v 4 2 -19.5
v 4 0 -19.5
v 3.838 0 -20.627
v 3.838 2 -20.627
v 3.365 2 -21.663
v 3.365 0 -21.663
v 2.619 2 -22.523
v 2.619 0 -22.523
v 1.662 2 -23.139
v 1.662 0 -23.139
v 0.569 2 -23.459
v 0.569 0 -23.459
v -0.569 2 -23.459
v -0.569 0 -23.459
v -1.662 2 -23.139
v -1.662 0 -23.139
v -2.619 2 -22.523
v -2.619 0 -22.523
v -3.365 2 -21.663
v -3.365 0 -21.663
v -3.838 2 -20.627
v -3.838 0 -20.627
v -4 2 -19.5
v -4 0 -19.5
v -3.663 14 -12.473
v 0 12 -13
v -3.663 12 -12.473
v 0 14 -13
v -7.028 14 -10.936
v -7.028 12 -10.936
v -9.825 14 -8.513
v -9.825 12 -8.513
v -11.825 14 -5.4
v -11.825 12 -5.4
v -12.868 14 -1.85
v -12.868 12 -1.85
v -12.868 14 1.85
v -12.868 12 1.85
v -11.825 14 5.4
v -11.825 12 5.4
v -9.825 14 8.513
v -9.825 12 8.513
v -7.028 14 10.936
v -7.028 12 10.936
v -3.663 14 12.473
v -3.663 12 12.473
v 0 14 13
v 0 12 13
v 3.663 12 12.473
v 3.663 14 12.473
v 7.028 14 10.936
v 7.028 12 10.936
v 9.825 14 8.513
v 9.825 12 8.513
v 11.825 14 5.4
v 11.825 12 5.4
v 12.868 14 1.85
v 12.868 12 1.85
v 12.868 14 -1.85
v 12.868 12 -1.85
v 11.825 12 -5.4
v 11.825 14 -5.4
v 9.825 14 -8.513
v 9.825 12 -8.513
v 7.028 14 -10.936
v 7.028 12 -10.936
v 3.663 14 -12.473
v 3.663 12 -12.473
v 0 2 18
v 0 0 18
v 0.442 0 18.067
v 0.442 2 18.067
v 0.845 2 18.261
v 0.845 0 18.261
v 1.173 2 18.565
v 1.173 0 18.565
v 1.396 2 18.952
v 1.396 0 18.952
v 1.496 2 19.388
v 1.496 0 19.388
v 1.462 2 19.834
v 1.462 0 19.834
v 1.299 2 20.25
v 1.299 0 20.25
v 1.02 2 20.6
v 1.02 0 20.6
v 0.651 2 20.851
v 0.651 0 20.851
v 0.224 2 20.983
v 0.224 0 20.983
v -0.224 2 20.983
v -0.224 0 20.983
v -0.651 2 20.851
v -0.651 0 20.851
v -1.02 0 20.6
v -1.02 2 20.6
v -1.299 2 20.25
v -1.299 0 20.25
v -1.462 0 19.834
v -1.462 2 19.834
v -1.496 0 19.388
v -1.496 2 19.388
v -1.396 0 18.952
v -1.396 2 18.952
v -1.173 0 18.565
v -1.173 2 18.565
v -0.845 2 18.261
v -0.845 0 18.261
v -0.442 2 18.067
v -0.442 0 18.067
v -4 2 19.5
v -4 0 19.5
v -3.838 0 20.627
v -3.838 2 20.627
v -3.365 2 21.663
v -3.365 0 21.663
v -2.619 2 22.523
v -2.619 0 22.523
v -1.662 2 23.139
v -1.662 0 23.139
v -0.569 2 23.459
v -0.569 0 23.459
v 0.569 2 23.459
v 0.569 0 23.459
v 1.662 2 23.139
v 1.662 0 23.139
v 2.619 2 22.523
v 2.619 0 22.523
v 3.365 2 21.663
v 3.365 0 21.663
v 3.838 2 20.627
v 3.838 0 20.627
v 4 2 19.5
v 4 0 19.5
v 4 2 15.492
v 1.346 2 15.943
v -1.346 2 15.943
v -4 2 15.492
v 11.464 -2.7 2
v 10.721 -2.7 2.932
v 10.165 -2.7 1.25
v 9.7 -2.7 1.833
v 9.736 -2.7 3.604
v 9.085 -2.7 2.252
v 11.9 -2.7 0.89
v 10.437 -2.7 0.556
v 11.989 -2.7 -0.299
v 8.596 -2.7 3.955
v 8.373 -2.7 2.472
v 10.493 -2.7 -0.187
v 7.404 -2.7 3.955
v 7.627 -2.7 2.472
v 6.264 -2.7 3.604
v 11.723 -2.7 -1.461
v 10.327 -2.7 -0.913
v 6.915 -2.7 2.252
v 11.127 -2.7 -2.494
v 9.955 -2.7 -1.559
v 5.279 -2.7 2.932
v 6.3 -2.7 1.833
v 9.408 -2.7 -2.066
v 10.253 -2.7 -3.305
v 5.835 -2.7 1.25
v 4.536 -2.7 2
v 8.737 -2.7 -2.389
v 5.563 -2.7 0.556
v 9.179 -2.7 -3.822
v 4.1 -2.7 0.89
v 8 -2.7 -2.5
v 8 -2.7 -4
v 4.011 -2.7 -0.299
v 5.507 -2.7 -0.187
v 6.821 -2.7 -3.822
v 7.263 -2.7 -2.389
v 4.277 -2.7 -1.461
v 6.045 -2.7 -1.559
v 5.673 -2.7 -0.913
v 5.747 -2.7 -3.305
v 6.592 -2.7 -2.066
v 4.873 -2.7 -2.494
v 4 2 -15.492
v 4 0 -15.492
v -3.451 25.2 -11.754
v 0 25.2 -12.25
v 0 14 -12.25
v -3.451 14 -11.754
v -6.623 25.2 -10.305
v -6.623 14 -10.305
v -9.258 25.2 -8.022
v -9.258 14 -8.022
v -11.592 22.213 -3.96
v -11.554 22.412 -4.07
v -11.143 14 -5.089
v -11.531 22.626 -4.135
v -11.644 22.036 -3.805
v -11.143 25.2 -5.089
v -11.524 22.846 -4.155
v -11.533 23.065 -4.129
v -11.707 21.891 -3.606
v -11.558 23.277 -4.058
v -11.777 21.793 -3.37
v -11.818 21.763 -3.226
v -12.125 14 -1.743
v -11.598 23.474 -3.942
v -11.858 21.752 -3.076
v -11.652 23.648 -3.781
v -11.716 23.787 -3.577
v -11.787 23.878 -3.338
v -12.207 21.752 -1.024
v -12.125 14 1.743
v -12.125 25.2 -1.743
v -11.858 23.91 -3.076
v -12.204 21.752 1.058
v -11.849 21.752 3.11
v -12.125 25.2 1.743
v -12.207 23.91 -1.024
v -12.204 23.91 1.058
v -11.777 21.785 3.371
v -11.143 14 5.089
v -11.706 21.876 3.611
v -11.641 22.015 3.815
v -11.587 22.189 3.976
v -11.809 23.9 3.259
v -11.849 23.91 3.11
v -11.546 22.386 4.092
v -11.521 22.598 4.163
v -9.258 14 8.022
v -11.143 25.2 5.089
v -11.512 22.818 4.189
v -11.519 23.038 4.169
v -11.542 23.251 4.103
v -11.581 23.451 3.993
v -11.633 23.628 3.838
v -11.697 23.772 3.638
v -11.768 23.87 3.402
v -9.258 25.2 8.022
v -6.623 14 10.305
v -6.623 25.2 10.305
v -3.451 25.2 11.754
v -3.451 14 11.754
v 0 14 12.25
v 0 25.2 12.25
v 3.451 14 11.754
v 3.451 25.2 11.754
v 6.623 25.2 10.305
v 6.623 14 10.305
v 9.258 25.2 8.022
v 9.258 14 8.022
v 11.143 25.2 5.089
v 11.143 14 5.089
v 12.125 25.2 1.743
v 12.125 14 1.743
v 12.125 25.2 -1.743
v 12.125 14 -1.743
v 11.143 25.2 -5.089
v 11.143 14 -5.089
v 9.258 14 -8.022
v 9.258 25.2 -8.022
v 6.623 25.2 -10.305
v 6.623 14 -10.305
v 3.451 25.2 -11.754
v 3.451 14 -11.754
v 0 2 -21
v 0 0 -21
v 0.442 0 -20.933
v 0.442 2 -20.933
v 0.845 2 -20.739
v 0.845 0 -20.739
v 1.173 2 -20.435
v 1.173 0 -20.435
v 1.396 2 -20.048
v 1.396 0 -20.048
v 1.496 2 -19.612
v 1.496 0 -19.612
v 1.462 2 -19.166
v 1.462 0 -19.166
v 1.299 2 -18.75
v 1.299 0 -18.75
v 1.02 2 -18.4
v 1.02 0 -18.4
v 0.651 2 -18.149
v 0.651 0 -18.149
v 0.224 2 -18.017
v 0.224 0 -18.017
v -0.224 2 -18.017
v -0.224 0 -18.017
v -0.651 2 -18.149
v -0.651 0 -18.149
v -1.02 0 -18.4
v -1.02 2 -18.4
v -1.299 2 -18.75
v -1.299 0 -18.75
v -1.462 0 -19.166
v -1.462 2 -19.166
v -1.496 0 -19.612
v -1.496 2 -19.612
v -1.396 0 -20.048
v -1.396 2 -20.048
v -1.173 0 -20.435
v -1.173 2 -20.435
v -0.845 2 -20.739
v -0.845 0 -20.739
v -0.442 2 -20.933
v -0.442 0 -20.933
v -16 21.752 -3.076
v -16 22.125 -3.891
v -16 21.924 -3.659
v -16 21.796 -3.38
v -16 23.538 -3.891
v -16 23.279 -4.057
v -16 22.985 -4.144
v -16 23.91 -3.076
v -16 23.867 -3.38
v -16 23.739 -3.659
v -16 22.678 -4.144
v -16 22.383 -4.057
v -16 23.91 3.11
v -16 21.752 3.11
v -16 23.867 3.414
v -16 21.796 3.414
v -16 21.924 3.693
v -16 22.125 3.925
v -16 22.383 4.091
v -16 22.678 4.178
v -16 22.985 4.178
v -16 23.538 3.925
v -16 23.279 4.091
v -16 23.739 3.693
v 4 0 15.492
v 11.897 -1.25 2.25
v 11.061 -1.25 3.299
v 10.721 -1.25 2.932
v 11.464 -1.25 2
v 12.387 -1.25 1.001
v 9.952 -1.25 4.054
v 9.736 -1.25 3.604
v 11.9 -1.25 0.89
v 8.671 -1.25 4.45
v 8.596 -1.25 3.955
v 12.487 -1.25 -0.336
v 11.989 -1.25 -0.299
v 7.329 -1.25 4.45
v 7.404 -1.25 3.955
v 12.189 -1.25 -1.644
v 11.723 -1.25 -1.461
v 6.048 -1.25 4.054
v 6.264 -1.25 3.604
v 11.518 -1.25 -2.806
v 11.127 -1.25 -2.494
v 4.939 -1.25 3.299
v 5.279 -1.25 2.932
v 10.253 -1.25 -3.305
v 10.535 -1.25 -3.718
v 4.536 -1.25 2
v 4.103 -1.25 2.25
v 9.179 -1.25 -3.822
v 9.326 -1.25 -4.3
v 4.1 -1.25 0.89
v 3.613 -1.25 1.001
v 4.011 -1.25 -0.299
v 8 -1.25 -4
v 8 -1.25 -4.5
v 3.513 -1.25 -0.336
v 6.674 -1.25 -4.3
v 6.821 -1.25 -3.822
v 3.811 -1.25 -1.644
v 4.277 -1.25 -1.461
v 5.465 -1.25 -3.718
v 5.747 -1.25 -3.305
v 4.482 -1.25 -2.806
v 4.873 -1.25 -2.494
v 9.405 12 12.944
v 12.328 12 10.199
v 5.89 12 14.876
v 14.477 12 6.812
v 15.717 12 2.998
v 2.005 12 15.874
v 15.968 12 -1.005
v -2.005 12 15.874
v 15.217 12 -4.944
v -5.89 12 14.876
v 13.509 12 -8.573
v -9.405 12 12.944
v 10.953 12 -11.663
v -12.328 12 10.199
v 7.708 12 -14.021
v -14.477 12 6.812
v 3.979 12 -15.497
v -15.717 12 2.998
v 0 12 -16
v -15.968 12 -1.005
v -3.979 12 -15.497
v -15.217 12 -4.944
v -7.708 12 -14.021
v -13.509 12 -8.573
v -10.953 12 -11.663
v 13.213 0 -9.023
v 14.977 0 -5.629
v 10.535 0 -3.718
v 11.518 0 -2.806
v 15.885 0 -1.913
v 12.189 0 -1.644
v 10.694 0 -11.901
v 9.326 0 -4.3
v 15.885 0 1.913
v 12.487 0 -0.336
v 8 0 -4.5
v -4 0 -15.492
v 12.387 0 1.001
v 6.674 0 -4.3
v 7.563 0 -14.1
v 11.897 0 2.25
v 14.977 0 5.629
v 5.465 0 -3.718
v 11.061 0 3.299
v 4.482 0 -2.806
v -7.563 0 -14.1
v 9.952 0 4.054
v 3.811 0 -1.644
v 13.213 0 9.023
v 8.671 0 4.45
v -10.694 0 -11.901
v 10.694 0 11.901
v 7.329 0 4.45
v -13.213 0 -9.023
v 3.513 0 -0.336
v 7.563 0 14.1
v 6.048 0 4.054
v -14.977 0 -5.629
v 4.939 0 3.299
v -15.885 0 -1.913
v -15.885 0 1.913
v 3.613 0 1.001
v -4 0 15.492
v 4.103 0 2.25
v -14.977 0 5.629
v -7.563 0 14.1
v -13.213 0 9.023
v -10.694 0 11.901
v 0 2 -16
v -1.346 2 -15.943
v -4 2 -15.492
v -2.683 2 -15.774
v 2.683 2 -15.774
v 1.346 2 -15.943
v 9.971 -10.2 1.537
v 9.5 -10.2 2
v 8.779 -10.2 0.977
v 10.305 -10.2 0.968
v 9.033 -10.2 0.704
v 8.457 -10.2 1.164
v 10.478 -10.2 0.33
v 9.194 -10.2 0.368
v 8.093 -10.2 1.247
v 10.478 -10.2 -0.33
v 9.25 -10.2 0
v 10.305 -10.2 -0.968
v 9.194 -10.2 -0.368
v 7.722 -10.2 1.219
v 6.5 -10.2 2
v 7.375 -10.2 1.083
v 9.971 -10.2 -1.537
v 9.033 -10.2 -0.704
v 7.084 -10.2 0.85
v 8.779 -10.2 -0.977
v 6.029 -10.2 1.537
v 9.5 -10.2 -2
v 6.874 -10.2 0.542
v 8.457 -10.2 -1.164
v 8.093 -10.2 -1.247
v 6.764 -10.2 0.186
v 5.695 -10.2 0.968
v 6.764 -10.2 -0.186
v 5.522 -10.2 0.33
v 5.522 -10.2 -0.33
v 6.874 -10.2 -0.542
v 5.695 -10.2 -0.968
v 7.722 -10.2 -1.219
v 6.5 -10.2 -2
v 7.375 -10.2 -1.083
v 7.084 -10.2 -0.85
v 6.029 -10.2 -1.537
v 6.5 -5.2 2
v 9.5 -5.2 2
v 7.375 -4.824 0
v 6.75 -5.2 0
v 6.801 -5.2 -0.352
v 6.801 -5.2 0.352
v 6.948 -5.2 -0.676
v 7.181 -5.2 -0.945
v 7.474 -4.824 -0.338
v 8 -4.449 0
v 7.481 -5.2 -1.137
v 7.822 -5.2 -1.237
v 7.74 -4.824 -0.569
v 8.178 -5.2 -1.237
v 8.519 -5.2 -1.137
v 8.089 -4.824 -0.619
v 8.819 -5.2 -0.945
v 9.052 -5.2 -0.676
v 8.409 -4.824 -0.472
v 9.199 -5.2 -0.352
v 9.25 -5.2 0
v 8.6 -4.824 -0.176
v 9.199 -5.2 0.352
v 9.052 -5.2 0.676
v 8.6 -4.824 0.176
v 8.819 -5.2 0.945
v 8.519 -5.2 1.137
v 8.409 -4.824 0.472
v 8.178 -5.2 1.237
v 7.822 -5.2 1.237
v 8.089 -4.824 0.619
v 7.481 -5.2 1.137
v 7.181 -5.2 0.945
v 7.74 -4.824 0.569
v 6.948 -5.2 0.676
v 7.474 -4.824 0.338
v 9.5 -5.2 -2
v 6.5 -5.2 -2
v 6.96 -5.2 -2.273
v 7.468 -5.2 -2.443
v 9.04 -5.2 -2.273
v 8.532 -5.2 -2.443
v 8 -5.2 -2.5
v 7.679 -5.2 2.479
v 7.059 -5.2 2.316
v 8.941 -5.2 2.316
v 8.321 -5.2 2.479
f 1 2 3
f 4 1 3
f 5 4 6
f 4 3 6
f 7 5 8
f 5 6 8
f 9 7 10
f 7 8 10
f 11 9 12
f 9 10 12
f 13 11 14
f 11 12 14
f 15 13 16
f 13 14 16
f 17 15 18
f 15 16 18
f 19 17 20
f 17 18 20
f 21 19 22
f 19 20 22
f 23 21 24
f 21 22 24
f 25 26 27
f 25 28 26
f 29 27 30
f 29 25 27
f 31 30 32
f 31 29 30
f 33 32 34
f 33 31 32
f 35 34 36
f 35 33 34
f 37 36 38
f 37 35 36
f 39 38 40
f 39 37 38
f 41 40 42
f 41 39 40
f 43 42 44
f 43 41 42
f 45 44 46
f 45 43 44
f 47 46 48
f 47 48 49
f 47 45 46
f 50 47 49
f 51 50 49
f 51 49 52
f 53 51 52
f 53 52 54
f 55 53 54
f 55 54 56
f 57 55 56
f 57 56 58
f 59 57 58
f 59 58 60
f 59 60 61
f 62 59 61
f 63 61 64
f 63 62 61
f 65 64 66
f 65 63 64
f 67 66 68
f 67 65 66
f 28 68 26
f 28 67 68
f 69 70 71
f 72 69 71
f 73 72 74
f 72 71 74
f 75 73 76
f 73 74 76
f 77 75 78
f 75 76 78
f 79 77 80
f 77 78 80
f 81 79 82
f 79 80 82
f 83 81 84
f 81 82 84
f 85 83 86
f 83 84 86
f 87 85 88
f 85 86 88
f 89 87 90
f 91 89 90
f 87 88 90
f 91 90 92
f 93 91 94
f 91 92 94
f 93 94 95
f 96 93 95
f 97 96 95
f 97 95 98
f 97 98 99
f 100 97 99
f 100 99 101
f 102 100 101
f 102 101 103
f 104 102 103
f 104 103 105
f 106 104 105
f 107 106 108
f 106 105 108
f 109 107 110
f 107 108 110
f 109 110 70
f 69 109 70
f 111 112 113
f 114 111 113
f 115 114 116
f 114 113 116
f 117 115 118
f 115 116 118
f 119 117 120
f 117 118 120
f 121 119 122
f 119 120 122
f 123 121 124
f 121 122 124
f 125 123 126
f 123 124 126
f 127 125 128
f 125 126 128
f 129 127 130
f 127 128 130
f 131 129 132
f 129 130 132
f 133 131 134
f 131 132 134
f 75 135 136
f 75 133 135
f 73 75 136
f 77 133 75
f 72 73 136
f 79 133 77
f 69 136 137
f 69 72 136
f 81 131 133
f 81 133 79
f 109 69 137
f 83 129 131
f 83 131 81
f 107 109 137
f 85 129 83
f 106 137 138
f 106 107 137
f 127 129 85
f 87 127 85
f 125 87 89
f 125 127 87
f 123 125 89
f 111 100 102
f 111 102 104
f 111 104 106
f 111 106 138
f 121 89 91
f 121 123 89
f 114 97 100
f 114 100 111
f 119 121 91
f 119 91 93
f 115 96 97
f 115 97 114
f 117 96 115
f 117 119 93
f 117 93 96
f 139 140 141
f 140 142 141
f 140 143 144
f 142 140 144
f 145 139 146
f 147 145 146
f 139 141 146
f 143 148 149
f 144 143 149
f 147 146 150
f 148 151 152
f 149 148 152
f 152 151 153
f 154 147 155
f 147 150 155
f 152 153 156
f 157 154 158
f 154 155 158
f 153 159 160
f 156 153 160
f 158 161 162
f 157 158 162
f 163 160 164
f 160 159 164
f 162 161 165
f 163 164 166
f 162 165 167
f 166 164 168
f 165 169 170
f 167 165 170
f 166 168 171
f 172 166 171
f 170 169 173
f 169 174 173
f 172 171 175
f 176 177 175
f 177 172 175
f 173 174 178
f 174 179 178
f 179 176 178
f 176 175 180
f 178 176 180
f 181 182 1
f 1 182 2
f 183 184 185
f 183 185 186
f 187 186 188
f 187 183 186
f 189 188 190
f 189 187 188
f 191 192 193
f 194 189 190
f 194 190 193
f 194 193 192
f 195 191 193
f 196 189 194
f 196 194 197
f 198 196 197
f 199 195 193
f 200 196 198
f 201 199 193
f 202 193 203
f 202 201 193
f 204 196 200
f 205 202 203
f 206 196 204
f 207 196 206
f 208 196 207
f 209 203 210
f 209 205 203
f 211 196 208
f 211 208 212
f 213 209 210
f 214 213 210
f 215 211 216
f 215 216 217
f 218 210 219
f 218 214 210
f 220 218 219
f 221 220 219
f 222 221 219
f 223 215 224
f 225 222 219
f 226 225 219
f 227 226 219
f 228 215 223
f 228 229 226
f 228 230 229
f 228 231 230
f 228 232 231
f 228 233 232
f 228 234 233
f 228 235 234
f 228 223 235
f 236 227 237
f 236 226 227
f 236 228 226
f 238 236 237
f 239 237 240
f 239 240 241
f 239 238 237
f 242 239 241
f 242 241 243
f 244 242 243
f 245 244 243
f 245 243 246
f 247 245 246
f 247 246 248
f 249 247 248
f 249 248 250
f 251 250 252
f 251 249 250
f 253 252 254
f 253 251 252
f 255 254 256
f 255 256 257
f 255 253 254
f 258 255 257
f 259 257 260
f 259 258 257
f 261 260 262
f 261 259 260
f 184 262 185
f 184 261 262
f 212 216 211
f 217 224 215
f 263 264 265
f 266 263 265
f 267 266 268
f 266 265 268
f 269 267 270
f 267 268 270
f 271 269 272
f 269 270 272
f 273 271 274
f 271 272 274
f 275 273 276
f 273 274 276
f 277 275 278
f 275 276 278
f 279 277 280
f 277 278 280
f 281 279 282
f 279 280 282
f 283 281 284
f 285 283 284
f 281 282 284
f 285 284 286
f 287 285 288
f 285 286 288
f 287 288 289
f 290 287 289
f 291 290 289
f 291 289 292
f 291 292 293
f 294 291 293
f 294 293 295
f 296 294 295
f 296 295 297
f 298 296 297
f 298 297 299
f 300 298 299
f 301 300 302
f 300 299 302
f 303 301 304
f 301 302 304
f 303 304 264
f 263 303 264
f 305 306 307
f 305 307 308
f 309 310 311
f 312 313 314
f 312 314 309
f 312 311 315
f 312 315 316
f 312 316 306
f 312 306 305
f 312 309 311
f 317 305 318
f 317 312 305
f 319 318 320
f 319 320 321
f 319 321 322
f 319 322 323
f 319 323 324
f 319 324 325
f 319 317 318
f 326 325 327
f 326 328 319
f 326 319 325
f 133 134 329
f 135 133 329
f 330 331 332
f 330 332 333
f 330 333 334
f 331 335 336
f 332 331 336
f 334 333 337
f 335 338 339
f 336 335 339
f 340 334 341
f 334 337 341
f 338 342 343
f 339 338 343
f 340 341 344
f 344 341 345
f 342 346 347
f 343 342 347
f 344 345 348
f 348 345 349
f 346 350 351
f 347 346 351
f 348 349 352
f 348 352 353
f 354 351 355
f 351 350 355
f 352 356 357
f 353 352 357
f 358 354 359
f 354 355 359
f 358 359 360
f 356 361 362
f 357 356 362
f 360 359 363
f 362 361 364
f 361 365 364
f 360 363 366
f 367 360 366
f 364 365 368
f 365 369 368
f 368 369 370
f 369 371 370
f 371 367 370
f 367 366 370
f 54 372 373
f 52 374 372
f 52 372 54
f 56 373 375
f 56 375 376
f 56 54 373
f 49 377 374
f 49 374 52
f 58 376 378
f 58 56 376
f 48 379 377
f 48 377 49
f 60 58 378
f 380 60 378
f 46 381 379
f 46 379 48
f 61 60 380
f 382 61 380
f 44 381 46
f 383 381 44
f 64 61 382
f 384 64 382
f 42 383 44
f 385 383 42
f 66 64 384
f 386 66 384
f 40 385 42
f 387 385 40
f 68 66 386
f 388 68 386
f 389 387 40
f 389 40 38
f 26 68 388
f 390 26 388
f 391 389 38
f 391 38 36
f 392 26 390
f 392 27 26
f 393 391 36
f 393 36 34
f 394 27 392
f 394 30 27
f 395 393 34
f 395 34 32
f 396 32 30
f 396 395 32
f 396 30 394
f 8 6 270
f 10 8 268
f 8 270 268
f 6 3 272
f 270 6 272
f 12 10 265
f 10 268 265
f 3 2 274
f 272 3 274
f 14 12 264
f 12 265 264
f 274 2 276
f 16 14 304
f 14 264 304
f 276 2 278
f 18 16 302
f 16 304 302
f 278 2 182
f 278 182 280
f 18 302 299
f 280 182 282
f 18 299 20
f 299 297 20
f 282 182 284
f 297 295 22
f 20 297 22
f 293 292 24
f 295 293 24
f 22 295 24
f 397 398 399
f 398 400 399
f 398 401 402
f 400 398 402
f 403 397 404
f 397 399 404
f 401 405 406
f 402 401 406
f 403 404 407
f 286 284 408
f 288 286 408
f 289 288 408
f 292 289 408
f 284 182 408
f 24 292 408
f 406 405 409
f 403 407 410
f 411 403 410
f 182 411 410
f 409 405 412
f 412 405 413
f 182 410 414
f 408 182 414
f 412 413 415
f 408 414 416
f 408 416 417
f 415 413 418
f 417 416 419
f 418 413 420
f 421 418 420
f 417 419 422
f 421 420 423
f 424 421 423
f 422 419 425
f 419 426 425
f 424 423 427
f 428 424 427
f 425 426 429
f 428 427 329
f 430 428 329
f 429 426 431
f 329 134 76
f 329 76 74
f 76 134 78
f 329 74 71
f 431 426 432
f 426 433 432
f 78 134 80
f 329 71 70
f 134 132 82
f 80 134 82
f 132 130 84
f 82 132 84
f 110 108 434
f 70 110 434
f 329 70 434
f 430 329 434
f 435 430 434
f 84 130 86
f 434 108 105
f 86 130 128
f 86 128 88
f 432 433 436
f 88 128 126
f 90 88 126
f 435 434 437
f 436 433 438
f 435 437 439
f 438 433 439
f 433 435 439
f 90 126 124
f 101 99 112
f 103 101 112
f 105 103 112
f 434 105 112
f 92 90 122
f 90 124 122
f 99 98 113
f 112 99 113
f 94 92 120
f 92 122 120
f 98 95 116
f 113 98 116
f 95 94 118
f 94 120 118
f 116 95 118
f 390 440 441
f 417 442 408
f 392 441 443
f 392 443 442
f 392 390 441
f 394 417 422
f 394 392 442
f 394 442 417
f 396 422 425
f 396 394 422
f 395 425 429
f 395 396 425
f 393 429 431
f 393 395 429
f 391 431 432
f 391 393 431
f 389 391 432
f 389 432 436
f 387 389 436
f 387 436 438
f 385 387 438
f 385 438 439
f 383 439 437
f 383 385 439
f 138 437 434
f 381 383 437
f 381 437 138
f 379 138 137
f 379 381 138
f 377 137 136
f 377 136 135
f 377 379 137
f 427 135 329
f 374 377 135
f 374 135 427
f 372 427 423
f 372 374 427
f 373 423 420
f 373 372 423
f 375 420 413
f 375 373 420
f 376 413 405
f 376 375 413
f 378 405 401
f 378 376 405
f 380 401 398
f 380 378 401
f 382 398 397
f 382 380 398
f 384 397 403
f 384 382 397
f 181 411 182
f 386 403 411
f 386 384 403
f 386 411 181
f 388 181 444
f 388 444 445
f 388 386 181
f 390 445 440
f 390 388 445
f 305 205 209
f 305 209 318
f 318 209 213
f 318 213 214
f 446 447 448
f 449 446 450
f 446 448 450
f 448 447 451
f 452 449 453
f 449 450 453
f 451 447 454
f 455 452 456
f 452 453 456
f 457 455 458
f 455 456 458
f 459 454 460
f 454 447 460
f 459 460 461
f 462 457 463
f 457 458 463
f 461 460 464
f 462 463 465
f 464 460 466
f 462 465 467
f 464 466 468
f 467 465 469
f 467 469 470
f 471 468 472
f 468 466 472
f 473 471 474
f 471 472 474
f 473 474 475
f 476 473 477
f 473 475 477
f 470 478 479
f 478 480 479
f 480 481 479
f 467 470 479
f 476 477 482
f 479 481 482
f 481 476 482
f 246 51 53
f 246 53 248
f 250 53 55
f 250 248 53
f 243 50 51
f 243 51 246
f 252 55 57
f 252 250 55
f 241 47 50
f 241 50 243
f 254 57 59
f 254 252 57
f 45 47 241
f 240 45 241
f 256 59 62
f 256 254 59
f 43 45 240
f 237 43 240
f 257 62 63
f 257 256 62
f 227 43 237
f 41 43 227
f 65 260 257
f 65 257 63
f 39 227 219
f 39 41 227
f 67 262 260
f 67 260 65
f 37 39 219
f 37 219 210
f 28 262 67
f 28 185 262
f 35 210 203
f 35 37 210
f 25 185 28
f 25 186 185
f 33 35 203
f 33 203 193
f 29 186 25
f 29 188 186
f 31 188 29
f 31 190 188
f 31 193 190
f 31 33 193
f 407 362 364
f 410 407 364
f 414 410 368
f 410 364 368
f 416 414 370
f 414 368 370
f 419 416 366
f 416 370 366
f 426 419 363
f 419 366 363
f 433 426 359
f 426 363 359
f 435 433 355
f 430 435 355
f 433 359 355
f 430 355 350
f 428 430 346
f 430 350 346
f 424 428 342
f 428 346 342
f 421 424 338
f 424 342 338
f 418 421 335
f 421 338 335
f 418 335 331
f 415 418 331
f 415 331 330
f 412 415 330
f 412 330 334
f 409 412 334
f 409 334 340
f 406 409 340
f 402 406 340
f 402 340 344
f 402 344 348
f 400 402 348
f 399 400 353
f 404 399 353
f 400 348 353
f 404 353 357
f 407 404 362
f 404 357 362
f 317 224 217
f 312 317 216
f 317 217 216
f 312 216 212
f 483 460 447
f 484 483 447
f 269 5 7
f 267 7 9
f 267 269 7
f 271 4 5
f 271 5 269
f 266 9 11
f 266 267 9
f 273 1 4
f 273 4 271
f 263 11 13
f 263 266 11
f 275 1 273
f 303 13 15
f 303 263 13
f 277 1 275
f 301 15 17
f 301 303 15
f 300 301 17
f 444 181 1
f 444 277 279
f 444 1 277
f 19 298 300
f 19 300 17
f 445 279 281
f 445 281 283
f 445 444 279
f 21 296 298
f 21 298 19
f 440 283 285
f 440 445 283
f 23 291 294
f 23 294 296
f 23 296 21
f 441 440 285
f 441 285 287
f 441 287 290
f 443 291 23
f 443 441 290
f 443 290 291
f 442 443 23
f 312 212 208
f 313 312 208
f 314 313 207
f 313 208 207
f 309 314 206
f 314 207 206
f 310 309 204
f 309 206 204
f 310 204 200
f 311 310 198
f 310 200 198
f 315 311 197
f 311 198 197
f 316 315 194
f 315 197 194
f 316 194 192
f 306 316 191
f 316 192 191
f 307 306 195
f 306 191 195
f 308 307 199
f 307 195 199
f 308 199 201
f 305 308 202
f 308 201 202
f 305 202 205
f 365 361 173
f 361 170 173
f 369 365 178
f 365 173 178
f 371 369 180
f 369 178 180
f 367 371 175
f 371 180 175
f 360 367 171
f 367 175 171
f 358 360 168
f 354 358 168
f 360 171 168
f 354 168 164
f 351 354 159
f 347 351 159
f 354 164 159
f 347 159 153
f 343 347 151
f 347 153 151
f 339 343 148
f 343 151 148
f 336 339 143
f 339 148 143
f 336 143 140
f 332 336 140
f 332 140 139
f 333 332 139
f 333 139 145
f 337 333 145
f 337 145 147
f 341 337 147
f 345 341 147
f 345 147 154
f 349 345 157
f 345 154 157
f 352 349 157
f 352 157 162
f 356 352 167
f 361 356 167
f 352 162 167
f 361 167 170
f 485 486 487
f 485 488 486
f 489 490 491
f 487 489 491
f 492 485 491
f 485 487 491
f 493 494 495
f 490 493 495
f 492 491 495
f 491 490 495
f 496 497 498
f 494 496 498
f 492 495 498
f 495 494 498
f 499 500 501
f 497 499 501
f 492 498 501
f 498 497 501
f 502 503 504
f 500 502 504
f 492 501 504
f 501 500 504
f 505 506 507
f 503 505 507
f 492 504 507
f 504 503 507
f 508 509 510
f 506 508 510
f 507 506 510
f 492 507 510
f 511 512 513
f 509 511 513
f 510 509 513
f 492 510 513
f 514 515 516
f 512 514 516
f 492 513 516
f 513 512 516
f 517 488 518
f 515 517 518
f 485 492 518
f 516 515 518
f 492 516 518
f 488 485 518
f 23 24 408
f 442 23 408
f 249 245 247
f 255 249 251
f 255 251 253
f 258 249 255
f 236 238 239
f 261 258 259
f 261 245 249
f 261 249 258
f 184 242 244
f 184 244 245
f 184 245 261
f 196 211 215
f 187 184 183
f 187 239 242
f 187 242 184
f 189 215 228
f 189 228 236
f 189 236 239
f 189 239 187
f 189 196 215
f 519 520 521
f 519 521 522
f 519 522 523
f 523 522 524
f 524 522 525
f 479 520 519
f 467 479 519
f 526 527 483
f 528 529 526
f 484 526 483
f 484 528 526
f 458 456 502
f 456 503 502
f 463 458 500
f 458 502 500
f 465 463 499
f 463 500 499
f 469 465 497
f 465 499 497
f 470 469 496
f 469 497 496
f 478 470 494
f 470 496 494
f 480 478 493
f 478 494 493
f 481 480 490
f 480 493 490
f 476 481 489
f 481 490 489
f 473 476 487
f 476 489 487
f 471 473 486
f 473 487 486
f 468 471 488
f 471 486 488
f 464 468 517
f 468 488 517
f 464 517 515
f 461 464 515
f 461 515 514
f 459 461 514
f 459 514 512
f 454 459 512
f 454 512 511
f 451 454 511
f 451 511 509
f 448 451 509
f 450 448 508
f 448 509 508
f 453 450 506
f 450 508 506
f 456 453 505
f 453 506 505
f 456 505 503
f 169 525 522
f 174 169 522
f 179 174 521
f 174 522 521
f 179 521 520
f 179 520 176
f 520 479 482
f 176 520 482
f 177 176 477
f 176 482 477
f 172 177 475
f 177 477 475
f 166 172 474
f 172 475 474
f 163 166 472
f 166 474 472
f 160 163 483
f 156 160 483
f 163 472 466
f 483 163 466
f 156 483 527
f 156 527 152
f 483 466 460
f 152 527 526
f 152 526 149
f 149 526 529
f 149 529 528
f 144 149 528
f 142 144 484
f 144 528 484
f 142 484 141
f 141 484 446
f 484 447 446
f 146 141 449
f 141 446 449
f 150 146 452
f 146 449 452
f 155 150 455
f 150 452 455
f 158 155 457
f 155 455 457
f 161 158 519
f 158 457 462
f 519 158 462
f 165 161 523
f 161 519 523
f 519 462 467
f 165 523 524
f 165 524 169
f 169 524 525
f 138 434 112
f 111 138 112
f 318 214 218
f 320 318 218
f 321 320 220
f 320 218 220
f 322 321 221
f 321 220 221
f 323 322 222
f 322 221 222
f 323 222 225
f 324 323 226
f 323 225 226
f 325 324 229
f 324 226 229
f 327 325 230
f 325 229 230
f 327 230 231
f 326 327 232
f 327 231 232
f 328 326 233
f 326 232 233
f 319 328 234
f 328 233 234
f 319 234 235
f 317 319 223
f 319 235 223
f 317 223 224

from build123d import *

# Parameters (mm, degrees)
HOLE_WIZARD_M3_1_D     = 2.5
HOLE_WIZARD_M3_1_DEPTH = 5
HOLE_WIZARD_M3_1_TIP   = 0.751075774
SKETCH_5_W             = 10.630358464
SKETCH_5_H             = 3.551561409
SKETCH_5_W_2           = 11.579063223
SKETCH_5_H_2           = 3.065046147
CUT_EXTRUDE_1_DEPTH    = 5
SKETCH_6_R             = 1.5
EXTRUDE_1_DEPTH        = 2
EXTRUDE_2_DEPTH        = 16


with BuildPart() as part:
    # 草图1 → 旋转1 (revolve)
    with BuildSketch(Plane.XY, mode=Mode.PRIVATE) as revolve_1_sk:
        Polygon((0, 0), (-16, 0), (-16, 12), (-13, 12), (-13, 14), (-12.25, 14), (-12.25, 25.2), (0, 25.2), align=None)
    revolve(revolve_1_sk.sketch.rotate(Axis((0, 0, 0), (0, 1, 0)), 270), axis=Axis((0, 0, 0), (0, 1, 0)))

    # 草图2 → 旋转2 (revolve)
    with BuildSketch(Plane.XY, mode=Mode.PRIVATE) as revolve_2_sk:
        Polygon((3.5, 0), (3.5, -1.25), (4, -1.25), (4, -2.7), (5.5, -2.7), (5.5, -10.2), (8, -10.2), (8, 0), align=None)
    revolve(revolve_2_sk.sketch.rotate(Axis((8, -10.2, 0), (0, 1, 0)), 270), axis=Axis((8, -10.2, 0), (0, 1, 0)))

    # M3 螺纹孔1
    with Locations(Plane(origin=(0, -10.2, 0), x_dir=(-1, 0, 0), z_dir=(0, -1, 0))):
        with Locations((-8, 0)):
            Hole(HOLE_WIZARD_M3_1_D / 2, depth=HOLE_WIZARD_M3_1_DEPTH)
            with Locations((0, 0, -(HOLE_WIZARD_M3_1_DEPTH + HOLE_WIZARD_M3_1_TIP / 2))):  # 118° drill point
                Cone(0, HOLE_WIZARD_M3_1_D / 2, HOLE_WIZARD_M3_1_TIP, mode=Mode.SUBTRACT)

    # 草图5 → 切除-拉伸1 (cut)
    with BuildSketch(Plane.XZ.offset(10.2)):
        with Locations((8.725419138, 3.775780705)):
            Rectangle(SKETCH_5_W, SKETCH_5_H)
        with Locations((9.759264069, -3.532523074)):
            Rectangle(SKETCH_5_W_2, SKETCH_5_H_2)
    extrude(amount=-CUT_EXTRUDE_1_DEPTH, mode=Mode.SUBTRACT)

    # 草图6 → 凸台-拉伸1 (add)
    with BuildSketch(Plane.XZ):
        with BuildLine():
            Line((-4, -19.5), (-4, 19.5))
            ThreePointArc((-4, 19.5), (0, 23.5), (4, 19.5))
            Line((4, 19.5), (4, -19.5))
            ThreePointArc((4, -19.5), (0, -23.5), (-4, -19.5))
        make_face()
        with Locations(Location((0, -19.5, 0), (0, 0, 270))):
            Circle(SKETCH_6_R, mode=Mode.SUBTRACT)
        with Locations(Location((0, 19.5, 0), (0, 0, 270))):
            Circle(SKETCH_6_R, mode=Mode.SUBTRACT)
    extrude(amount=-EXTRUDE_1_DEPTH)

    # 草图7 → 凸台-拉伸2 (add)
    with BuildSketch(Plane(origin=(0, 0, 0), x_dir=(0, 0, -1), z_dir=(1, 0, 0))):
        with BuildLine():
            Line((3.07585982, 21.752332949), (-3.109660478, 21.752332949))
            ThreePointArc((-3.109660478, 21.752332949), (-4.188603578, 22.83127605), (-3.109660478, 23.91021915))
            Line((-3.109660478, 23.91021915), (3.07585982, 23.91021915))
            ThreePointArc((3.07585982, 23.91021915), (4.154802921, 22.83127605), (3.07585982, 21.752332949))
        make_face()
    extrude(amount=-EXTRUDE_2_DEPTH)


solid = part.part
